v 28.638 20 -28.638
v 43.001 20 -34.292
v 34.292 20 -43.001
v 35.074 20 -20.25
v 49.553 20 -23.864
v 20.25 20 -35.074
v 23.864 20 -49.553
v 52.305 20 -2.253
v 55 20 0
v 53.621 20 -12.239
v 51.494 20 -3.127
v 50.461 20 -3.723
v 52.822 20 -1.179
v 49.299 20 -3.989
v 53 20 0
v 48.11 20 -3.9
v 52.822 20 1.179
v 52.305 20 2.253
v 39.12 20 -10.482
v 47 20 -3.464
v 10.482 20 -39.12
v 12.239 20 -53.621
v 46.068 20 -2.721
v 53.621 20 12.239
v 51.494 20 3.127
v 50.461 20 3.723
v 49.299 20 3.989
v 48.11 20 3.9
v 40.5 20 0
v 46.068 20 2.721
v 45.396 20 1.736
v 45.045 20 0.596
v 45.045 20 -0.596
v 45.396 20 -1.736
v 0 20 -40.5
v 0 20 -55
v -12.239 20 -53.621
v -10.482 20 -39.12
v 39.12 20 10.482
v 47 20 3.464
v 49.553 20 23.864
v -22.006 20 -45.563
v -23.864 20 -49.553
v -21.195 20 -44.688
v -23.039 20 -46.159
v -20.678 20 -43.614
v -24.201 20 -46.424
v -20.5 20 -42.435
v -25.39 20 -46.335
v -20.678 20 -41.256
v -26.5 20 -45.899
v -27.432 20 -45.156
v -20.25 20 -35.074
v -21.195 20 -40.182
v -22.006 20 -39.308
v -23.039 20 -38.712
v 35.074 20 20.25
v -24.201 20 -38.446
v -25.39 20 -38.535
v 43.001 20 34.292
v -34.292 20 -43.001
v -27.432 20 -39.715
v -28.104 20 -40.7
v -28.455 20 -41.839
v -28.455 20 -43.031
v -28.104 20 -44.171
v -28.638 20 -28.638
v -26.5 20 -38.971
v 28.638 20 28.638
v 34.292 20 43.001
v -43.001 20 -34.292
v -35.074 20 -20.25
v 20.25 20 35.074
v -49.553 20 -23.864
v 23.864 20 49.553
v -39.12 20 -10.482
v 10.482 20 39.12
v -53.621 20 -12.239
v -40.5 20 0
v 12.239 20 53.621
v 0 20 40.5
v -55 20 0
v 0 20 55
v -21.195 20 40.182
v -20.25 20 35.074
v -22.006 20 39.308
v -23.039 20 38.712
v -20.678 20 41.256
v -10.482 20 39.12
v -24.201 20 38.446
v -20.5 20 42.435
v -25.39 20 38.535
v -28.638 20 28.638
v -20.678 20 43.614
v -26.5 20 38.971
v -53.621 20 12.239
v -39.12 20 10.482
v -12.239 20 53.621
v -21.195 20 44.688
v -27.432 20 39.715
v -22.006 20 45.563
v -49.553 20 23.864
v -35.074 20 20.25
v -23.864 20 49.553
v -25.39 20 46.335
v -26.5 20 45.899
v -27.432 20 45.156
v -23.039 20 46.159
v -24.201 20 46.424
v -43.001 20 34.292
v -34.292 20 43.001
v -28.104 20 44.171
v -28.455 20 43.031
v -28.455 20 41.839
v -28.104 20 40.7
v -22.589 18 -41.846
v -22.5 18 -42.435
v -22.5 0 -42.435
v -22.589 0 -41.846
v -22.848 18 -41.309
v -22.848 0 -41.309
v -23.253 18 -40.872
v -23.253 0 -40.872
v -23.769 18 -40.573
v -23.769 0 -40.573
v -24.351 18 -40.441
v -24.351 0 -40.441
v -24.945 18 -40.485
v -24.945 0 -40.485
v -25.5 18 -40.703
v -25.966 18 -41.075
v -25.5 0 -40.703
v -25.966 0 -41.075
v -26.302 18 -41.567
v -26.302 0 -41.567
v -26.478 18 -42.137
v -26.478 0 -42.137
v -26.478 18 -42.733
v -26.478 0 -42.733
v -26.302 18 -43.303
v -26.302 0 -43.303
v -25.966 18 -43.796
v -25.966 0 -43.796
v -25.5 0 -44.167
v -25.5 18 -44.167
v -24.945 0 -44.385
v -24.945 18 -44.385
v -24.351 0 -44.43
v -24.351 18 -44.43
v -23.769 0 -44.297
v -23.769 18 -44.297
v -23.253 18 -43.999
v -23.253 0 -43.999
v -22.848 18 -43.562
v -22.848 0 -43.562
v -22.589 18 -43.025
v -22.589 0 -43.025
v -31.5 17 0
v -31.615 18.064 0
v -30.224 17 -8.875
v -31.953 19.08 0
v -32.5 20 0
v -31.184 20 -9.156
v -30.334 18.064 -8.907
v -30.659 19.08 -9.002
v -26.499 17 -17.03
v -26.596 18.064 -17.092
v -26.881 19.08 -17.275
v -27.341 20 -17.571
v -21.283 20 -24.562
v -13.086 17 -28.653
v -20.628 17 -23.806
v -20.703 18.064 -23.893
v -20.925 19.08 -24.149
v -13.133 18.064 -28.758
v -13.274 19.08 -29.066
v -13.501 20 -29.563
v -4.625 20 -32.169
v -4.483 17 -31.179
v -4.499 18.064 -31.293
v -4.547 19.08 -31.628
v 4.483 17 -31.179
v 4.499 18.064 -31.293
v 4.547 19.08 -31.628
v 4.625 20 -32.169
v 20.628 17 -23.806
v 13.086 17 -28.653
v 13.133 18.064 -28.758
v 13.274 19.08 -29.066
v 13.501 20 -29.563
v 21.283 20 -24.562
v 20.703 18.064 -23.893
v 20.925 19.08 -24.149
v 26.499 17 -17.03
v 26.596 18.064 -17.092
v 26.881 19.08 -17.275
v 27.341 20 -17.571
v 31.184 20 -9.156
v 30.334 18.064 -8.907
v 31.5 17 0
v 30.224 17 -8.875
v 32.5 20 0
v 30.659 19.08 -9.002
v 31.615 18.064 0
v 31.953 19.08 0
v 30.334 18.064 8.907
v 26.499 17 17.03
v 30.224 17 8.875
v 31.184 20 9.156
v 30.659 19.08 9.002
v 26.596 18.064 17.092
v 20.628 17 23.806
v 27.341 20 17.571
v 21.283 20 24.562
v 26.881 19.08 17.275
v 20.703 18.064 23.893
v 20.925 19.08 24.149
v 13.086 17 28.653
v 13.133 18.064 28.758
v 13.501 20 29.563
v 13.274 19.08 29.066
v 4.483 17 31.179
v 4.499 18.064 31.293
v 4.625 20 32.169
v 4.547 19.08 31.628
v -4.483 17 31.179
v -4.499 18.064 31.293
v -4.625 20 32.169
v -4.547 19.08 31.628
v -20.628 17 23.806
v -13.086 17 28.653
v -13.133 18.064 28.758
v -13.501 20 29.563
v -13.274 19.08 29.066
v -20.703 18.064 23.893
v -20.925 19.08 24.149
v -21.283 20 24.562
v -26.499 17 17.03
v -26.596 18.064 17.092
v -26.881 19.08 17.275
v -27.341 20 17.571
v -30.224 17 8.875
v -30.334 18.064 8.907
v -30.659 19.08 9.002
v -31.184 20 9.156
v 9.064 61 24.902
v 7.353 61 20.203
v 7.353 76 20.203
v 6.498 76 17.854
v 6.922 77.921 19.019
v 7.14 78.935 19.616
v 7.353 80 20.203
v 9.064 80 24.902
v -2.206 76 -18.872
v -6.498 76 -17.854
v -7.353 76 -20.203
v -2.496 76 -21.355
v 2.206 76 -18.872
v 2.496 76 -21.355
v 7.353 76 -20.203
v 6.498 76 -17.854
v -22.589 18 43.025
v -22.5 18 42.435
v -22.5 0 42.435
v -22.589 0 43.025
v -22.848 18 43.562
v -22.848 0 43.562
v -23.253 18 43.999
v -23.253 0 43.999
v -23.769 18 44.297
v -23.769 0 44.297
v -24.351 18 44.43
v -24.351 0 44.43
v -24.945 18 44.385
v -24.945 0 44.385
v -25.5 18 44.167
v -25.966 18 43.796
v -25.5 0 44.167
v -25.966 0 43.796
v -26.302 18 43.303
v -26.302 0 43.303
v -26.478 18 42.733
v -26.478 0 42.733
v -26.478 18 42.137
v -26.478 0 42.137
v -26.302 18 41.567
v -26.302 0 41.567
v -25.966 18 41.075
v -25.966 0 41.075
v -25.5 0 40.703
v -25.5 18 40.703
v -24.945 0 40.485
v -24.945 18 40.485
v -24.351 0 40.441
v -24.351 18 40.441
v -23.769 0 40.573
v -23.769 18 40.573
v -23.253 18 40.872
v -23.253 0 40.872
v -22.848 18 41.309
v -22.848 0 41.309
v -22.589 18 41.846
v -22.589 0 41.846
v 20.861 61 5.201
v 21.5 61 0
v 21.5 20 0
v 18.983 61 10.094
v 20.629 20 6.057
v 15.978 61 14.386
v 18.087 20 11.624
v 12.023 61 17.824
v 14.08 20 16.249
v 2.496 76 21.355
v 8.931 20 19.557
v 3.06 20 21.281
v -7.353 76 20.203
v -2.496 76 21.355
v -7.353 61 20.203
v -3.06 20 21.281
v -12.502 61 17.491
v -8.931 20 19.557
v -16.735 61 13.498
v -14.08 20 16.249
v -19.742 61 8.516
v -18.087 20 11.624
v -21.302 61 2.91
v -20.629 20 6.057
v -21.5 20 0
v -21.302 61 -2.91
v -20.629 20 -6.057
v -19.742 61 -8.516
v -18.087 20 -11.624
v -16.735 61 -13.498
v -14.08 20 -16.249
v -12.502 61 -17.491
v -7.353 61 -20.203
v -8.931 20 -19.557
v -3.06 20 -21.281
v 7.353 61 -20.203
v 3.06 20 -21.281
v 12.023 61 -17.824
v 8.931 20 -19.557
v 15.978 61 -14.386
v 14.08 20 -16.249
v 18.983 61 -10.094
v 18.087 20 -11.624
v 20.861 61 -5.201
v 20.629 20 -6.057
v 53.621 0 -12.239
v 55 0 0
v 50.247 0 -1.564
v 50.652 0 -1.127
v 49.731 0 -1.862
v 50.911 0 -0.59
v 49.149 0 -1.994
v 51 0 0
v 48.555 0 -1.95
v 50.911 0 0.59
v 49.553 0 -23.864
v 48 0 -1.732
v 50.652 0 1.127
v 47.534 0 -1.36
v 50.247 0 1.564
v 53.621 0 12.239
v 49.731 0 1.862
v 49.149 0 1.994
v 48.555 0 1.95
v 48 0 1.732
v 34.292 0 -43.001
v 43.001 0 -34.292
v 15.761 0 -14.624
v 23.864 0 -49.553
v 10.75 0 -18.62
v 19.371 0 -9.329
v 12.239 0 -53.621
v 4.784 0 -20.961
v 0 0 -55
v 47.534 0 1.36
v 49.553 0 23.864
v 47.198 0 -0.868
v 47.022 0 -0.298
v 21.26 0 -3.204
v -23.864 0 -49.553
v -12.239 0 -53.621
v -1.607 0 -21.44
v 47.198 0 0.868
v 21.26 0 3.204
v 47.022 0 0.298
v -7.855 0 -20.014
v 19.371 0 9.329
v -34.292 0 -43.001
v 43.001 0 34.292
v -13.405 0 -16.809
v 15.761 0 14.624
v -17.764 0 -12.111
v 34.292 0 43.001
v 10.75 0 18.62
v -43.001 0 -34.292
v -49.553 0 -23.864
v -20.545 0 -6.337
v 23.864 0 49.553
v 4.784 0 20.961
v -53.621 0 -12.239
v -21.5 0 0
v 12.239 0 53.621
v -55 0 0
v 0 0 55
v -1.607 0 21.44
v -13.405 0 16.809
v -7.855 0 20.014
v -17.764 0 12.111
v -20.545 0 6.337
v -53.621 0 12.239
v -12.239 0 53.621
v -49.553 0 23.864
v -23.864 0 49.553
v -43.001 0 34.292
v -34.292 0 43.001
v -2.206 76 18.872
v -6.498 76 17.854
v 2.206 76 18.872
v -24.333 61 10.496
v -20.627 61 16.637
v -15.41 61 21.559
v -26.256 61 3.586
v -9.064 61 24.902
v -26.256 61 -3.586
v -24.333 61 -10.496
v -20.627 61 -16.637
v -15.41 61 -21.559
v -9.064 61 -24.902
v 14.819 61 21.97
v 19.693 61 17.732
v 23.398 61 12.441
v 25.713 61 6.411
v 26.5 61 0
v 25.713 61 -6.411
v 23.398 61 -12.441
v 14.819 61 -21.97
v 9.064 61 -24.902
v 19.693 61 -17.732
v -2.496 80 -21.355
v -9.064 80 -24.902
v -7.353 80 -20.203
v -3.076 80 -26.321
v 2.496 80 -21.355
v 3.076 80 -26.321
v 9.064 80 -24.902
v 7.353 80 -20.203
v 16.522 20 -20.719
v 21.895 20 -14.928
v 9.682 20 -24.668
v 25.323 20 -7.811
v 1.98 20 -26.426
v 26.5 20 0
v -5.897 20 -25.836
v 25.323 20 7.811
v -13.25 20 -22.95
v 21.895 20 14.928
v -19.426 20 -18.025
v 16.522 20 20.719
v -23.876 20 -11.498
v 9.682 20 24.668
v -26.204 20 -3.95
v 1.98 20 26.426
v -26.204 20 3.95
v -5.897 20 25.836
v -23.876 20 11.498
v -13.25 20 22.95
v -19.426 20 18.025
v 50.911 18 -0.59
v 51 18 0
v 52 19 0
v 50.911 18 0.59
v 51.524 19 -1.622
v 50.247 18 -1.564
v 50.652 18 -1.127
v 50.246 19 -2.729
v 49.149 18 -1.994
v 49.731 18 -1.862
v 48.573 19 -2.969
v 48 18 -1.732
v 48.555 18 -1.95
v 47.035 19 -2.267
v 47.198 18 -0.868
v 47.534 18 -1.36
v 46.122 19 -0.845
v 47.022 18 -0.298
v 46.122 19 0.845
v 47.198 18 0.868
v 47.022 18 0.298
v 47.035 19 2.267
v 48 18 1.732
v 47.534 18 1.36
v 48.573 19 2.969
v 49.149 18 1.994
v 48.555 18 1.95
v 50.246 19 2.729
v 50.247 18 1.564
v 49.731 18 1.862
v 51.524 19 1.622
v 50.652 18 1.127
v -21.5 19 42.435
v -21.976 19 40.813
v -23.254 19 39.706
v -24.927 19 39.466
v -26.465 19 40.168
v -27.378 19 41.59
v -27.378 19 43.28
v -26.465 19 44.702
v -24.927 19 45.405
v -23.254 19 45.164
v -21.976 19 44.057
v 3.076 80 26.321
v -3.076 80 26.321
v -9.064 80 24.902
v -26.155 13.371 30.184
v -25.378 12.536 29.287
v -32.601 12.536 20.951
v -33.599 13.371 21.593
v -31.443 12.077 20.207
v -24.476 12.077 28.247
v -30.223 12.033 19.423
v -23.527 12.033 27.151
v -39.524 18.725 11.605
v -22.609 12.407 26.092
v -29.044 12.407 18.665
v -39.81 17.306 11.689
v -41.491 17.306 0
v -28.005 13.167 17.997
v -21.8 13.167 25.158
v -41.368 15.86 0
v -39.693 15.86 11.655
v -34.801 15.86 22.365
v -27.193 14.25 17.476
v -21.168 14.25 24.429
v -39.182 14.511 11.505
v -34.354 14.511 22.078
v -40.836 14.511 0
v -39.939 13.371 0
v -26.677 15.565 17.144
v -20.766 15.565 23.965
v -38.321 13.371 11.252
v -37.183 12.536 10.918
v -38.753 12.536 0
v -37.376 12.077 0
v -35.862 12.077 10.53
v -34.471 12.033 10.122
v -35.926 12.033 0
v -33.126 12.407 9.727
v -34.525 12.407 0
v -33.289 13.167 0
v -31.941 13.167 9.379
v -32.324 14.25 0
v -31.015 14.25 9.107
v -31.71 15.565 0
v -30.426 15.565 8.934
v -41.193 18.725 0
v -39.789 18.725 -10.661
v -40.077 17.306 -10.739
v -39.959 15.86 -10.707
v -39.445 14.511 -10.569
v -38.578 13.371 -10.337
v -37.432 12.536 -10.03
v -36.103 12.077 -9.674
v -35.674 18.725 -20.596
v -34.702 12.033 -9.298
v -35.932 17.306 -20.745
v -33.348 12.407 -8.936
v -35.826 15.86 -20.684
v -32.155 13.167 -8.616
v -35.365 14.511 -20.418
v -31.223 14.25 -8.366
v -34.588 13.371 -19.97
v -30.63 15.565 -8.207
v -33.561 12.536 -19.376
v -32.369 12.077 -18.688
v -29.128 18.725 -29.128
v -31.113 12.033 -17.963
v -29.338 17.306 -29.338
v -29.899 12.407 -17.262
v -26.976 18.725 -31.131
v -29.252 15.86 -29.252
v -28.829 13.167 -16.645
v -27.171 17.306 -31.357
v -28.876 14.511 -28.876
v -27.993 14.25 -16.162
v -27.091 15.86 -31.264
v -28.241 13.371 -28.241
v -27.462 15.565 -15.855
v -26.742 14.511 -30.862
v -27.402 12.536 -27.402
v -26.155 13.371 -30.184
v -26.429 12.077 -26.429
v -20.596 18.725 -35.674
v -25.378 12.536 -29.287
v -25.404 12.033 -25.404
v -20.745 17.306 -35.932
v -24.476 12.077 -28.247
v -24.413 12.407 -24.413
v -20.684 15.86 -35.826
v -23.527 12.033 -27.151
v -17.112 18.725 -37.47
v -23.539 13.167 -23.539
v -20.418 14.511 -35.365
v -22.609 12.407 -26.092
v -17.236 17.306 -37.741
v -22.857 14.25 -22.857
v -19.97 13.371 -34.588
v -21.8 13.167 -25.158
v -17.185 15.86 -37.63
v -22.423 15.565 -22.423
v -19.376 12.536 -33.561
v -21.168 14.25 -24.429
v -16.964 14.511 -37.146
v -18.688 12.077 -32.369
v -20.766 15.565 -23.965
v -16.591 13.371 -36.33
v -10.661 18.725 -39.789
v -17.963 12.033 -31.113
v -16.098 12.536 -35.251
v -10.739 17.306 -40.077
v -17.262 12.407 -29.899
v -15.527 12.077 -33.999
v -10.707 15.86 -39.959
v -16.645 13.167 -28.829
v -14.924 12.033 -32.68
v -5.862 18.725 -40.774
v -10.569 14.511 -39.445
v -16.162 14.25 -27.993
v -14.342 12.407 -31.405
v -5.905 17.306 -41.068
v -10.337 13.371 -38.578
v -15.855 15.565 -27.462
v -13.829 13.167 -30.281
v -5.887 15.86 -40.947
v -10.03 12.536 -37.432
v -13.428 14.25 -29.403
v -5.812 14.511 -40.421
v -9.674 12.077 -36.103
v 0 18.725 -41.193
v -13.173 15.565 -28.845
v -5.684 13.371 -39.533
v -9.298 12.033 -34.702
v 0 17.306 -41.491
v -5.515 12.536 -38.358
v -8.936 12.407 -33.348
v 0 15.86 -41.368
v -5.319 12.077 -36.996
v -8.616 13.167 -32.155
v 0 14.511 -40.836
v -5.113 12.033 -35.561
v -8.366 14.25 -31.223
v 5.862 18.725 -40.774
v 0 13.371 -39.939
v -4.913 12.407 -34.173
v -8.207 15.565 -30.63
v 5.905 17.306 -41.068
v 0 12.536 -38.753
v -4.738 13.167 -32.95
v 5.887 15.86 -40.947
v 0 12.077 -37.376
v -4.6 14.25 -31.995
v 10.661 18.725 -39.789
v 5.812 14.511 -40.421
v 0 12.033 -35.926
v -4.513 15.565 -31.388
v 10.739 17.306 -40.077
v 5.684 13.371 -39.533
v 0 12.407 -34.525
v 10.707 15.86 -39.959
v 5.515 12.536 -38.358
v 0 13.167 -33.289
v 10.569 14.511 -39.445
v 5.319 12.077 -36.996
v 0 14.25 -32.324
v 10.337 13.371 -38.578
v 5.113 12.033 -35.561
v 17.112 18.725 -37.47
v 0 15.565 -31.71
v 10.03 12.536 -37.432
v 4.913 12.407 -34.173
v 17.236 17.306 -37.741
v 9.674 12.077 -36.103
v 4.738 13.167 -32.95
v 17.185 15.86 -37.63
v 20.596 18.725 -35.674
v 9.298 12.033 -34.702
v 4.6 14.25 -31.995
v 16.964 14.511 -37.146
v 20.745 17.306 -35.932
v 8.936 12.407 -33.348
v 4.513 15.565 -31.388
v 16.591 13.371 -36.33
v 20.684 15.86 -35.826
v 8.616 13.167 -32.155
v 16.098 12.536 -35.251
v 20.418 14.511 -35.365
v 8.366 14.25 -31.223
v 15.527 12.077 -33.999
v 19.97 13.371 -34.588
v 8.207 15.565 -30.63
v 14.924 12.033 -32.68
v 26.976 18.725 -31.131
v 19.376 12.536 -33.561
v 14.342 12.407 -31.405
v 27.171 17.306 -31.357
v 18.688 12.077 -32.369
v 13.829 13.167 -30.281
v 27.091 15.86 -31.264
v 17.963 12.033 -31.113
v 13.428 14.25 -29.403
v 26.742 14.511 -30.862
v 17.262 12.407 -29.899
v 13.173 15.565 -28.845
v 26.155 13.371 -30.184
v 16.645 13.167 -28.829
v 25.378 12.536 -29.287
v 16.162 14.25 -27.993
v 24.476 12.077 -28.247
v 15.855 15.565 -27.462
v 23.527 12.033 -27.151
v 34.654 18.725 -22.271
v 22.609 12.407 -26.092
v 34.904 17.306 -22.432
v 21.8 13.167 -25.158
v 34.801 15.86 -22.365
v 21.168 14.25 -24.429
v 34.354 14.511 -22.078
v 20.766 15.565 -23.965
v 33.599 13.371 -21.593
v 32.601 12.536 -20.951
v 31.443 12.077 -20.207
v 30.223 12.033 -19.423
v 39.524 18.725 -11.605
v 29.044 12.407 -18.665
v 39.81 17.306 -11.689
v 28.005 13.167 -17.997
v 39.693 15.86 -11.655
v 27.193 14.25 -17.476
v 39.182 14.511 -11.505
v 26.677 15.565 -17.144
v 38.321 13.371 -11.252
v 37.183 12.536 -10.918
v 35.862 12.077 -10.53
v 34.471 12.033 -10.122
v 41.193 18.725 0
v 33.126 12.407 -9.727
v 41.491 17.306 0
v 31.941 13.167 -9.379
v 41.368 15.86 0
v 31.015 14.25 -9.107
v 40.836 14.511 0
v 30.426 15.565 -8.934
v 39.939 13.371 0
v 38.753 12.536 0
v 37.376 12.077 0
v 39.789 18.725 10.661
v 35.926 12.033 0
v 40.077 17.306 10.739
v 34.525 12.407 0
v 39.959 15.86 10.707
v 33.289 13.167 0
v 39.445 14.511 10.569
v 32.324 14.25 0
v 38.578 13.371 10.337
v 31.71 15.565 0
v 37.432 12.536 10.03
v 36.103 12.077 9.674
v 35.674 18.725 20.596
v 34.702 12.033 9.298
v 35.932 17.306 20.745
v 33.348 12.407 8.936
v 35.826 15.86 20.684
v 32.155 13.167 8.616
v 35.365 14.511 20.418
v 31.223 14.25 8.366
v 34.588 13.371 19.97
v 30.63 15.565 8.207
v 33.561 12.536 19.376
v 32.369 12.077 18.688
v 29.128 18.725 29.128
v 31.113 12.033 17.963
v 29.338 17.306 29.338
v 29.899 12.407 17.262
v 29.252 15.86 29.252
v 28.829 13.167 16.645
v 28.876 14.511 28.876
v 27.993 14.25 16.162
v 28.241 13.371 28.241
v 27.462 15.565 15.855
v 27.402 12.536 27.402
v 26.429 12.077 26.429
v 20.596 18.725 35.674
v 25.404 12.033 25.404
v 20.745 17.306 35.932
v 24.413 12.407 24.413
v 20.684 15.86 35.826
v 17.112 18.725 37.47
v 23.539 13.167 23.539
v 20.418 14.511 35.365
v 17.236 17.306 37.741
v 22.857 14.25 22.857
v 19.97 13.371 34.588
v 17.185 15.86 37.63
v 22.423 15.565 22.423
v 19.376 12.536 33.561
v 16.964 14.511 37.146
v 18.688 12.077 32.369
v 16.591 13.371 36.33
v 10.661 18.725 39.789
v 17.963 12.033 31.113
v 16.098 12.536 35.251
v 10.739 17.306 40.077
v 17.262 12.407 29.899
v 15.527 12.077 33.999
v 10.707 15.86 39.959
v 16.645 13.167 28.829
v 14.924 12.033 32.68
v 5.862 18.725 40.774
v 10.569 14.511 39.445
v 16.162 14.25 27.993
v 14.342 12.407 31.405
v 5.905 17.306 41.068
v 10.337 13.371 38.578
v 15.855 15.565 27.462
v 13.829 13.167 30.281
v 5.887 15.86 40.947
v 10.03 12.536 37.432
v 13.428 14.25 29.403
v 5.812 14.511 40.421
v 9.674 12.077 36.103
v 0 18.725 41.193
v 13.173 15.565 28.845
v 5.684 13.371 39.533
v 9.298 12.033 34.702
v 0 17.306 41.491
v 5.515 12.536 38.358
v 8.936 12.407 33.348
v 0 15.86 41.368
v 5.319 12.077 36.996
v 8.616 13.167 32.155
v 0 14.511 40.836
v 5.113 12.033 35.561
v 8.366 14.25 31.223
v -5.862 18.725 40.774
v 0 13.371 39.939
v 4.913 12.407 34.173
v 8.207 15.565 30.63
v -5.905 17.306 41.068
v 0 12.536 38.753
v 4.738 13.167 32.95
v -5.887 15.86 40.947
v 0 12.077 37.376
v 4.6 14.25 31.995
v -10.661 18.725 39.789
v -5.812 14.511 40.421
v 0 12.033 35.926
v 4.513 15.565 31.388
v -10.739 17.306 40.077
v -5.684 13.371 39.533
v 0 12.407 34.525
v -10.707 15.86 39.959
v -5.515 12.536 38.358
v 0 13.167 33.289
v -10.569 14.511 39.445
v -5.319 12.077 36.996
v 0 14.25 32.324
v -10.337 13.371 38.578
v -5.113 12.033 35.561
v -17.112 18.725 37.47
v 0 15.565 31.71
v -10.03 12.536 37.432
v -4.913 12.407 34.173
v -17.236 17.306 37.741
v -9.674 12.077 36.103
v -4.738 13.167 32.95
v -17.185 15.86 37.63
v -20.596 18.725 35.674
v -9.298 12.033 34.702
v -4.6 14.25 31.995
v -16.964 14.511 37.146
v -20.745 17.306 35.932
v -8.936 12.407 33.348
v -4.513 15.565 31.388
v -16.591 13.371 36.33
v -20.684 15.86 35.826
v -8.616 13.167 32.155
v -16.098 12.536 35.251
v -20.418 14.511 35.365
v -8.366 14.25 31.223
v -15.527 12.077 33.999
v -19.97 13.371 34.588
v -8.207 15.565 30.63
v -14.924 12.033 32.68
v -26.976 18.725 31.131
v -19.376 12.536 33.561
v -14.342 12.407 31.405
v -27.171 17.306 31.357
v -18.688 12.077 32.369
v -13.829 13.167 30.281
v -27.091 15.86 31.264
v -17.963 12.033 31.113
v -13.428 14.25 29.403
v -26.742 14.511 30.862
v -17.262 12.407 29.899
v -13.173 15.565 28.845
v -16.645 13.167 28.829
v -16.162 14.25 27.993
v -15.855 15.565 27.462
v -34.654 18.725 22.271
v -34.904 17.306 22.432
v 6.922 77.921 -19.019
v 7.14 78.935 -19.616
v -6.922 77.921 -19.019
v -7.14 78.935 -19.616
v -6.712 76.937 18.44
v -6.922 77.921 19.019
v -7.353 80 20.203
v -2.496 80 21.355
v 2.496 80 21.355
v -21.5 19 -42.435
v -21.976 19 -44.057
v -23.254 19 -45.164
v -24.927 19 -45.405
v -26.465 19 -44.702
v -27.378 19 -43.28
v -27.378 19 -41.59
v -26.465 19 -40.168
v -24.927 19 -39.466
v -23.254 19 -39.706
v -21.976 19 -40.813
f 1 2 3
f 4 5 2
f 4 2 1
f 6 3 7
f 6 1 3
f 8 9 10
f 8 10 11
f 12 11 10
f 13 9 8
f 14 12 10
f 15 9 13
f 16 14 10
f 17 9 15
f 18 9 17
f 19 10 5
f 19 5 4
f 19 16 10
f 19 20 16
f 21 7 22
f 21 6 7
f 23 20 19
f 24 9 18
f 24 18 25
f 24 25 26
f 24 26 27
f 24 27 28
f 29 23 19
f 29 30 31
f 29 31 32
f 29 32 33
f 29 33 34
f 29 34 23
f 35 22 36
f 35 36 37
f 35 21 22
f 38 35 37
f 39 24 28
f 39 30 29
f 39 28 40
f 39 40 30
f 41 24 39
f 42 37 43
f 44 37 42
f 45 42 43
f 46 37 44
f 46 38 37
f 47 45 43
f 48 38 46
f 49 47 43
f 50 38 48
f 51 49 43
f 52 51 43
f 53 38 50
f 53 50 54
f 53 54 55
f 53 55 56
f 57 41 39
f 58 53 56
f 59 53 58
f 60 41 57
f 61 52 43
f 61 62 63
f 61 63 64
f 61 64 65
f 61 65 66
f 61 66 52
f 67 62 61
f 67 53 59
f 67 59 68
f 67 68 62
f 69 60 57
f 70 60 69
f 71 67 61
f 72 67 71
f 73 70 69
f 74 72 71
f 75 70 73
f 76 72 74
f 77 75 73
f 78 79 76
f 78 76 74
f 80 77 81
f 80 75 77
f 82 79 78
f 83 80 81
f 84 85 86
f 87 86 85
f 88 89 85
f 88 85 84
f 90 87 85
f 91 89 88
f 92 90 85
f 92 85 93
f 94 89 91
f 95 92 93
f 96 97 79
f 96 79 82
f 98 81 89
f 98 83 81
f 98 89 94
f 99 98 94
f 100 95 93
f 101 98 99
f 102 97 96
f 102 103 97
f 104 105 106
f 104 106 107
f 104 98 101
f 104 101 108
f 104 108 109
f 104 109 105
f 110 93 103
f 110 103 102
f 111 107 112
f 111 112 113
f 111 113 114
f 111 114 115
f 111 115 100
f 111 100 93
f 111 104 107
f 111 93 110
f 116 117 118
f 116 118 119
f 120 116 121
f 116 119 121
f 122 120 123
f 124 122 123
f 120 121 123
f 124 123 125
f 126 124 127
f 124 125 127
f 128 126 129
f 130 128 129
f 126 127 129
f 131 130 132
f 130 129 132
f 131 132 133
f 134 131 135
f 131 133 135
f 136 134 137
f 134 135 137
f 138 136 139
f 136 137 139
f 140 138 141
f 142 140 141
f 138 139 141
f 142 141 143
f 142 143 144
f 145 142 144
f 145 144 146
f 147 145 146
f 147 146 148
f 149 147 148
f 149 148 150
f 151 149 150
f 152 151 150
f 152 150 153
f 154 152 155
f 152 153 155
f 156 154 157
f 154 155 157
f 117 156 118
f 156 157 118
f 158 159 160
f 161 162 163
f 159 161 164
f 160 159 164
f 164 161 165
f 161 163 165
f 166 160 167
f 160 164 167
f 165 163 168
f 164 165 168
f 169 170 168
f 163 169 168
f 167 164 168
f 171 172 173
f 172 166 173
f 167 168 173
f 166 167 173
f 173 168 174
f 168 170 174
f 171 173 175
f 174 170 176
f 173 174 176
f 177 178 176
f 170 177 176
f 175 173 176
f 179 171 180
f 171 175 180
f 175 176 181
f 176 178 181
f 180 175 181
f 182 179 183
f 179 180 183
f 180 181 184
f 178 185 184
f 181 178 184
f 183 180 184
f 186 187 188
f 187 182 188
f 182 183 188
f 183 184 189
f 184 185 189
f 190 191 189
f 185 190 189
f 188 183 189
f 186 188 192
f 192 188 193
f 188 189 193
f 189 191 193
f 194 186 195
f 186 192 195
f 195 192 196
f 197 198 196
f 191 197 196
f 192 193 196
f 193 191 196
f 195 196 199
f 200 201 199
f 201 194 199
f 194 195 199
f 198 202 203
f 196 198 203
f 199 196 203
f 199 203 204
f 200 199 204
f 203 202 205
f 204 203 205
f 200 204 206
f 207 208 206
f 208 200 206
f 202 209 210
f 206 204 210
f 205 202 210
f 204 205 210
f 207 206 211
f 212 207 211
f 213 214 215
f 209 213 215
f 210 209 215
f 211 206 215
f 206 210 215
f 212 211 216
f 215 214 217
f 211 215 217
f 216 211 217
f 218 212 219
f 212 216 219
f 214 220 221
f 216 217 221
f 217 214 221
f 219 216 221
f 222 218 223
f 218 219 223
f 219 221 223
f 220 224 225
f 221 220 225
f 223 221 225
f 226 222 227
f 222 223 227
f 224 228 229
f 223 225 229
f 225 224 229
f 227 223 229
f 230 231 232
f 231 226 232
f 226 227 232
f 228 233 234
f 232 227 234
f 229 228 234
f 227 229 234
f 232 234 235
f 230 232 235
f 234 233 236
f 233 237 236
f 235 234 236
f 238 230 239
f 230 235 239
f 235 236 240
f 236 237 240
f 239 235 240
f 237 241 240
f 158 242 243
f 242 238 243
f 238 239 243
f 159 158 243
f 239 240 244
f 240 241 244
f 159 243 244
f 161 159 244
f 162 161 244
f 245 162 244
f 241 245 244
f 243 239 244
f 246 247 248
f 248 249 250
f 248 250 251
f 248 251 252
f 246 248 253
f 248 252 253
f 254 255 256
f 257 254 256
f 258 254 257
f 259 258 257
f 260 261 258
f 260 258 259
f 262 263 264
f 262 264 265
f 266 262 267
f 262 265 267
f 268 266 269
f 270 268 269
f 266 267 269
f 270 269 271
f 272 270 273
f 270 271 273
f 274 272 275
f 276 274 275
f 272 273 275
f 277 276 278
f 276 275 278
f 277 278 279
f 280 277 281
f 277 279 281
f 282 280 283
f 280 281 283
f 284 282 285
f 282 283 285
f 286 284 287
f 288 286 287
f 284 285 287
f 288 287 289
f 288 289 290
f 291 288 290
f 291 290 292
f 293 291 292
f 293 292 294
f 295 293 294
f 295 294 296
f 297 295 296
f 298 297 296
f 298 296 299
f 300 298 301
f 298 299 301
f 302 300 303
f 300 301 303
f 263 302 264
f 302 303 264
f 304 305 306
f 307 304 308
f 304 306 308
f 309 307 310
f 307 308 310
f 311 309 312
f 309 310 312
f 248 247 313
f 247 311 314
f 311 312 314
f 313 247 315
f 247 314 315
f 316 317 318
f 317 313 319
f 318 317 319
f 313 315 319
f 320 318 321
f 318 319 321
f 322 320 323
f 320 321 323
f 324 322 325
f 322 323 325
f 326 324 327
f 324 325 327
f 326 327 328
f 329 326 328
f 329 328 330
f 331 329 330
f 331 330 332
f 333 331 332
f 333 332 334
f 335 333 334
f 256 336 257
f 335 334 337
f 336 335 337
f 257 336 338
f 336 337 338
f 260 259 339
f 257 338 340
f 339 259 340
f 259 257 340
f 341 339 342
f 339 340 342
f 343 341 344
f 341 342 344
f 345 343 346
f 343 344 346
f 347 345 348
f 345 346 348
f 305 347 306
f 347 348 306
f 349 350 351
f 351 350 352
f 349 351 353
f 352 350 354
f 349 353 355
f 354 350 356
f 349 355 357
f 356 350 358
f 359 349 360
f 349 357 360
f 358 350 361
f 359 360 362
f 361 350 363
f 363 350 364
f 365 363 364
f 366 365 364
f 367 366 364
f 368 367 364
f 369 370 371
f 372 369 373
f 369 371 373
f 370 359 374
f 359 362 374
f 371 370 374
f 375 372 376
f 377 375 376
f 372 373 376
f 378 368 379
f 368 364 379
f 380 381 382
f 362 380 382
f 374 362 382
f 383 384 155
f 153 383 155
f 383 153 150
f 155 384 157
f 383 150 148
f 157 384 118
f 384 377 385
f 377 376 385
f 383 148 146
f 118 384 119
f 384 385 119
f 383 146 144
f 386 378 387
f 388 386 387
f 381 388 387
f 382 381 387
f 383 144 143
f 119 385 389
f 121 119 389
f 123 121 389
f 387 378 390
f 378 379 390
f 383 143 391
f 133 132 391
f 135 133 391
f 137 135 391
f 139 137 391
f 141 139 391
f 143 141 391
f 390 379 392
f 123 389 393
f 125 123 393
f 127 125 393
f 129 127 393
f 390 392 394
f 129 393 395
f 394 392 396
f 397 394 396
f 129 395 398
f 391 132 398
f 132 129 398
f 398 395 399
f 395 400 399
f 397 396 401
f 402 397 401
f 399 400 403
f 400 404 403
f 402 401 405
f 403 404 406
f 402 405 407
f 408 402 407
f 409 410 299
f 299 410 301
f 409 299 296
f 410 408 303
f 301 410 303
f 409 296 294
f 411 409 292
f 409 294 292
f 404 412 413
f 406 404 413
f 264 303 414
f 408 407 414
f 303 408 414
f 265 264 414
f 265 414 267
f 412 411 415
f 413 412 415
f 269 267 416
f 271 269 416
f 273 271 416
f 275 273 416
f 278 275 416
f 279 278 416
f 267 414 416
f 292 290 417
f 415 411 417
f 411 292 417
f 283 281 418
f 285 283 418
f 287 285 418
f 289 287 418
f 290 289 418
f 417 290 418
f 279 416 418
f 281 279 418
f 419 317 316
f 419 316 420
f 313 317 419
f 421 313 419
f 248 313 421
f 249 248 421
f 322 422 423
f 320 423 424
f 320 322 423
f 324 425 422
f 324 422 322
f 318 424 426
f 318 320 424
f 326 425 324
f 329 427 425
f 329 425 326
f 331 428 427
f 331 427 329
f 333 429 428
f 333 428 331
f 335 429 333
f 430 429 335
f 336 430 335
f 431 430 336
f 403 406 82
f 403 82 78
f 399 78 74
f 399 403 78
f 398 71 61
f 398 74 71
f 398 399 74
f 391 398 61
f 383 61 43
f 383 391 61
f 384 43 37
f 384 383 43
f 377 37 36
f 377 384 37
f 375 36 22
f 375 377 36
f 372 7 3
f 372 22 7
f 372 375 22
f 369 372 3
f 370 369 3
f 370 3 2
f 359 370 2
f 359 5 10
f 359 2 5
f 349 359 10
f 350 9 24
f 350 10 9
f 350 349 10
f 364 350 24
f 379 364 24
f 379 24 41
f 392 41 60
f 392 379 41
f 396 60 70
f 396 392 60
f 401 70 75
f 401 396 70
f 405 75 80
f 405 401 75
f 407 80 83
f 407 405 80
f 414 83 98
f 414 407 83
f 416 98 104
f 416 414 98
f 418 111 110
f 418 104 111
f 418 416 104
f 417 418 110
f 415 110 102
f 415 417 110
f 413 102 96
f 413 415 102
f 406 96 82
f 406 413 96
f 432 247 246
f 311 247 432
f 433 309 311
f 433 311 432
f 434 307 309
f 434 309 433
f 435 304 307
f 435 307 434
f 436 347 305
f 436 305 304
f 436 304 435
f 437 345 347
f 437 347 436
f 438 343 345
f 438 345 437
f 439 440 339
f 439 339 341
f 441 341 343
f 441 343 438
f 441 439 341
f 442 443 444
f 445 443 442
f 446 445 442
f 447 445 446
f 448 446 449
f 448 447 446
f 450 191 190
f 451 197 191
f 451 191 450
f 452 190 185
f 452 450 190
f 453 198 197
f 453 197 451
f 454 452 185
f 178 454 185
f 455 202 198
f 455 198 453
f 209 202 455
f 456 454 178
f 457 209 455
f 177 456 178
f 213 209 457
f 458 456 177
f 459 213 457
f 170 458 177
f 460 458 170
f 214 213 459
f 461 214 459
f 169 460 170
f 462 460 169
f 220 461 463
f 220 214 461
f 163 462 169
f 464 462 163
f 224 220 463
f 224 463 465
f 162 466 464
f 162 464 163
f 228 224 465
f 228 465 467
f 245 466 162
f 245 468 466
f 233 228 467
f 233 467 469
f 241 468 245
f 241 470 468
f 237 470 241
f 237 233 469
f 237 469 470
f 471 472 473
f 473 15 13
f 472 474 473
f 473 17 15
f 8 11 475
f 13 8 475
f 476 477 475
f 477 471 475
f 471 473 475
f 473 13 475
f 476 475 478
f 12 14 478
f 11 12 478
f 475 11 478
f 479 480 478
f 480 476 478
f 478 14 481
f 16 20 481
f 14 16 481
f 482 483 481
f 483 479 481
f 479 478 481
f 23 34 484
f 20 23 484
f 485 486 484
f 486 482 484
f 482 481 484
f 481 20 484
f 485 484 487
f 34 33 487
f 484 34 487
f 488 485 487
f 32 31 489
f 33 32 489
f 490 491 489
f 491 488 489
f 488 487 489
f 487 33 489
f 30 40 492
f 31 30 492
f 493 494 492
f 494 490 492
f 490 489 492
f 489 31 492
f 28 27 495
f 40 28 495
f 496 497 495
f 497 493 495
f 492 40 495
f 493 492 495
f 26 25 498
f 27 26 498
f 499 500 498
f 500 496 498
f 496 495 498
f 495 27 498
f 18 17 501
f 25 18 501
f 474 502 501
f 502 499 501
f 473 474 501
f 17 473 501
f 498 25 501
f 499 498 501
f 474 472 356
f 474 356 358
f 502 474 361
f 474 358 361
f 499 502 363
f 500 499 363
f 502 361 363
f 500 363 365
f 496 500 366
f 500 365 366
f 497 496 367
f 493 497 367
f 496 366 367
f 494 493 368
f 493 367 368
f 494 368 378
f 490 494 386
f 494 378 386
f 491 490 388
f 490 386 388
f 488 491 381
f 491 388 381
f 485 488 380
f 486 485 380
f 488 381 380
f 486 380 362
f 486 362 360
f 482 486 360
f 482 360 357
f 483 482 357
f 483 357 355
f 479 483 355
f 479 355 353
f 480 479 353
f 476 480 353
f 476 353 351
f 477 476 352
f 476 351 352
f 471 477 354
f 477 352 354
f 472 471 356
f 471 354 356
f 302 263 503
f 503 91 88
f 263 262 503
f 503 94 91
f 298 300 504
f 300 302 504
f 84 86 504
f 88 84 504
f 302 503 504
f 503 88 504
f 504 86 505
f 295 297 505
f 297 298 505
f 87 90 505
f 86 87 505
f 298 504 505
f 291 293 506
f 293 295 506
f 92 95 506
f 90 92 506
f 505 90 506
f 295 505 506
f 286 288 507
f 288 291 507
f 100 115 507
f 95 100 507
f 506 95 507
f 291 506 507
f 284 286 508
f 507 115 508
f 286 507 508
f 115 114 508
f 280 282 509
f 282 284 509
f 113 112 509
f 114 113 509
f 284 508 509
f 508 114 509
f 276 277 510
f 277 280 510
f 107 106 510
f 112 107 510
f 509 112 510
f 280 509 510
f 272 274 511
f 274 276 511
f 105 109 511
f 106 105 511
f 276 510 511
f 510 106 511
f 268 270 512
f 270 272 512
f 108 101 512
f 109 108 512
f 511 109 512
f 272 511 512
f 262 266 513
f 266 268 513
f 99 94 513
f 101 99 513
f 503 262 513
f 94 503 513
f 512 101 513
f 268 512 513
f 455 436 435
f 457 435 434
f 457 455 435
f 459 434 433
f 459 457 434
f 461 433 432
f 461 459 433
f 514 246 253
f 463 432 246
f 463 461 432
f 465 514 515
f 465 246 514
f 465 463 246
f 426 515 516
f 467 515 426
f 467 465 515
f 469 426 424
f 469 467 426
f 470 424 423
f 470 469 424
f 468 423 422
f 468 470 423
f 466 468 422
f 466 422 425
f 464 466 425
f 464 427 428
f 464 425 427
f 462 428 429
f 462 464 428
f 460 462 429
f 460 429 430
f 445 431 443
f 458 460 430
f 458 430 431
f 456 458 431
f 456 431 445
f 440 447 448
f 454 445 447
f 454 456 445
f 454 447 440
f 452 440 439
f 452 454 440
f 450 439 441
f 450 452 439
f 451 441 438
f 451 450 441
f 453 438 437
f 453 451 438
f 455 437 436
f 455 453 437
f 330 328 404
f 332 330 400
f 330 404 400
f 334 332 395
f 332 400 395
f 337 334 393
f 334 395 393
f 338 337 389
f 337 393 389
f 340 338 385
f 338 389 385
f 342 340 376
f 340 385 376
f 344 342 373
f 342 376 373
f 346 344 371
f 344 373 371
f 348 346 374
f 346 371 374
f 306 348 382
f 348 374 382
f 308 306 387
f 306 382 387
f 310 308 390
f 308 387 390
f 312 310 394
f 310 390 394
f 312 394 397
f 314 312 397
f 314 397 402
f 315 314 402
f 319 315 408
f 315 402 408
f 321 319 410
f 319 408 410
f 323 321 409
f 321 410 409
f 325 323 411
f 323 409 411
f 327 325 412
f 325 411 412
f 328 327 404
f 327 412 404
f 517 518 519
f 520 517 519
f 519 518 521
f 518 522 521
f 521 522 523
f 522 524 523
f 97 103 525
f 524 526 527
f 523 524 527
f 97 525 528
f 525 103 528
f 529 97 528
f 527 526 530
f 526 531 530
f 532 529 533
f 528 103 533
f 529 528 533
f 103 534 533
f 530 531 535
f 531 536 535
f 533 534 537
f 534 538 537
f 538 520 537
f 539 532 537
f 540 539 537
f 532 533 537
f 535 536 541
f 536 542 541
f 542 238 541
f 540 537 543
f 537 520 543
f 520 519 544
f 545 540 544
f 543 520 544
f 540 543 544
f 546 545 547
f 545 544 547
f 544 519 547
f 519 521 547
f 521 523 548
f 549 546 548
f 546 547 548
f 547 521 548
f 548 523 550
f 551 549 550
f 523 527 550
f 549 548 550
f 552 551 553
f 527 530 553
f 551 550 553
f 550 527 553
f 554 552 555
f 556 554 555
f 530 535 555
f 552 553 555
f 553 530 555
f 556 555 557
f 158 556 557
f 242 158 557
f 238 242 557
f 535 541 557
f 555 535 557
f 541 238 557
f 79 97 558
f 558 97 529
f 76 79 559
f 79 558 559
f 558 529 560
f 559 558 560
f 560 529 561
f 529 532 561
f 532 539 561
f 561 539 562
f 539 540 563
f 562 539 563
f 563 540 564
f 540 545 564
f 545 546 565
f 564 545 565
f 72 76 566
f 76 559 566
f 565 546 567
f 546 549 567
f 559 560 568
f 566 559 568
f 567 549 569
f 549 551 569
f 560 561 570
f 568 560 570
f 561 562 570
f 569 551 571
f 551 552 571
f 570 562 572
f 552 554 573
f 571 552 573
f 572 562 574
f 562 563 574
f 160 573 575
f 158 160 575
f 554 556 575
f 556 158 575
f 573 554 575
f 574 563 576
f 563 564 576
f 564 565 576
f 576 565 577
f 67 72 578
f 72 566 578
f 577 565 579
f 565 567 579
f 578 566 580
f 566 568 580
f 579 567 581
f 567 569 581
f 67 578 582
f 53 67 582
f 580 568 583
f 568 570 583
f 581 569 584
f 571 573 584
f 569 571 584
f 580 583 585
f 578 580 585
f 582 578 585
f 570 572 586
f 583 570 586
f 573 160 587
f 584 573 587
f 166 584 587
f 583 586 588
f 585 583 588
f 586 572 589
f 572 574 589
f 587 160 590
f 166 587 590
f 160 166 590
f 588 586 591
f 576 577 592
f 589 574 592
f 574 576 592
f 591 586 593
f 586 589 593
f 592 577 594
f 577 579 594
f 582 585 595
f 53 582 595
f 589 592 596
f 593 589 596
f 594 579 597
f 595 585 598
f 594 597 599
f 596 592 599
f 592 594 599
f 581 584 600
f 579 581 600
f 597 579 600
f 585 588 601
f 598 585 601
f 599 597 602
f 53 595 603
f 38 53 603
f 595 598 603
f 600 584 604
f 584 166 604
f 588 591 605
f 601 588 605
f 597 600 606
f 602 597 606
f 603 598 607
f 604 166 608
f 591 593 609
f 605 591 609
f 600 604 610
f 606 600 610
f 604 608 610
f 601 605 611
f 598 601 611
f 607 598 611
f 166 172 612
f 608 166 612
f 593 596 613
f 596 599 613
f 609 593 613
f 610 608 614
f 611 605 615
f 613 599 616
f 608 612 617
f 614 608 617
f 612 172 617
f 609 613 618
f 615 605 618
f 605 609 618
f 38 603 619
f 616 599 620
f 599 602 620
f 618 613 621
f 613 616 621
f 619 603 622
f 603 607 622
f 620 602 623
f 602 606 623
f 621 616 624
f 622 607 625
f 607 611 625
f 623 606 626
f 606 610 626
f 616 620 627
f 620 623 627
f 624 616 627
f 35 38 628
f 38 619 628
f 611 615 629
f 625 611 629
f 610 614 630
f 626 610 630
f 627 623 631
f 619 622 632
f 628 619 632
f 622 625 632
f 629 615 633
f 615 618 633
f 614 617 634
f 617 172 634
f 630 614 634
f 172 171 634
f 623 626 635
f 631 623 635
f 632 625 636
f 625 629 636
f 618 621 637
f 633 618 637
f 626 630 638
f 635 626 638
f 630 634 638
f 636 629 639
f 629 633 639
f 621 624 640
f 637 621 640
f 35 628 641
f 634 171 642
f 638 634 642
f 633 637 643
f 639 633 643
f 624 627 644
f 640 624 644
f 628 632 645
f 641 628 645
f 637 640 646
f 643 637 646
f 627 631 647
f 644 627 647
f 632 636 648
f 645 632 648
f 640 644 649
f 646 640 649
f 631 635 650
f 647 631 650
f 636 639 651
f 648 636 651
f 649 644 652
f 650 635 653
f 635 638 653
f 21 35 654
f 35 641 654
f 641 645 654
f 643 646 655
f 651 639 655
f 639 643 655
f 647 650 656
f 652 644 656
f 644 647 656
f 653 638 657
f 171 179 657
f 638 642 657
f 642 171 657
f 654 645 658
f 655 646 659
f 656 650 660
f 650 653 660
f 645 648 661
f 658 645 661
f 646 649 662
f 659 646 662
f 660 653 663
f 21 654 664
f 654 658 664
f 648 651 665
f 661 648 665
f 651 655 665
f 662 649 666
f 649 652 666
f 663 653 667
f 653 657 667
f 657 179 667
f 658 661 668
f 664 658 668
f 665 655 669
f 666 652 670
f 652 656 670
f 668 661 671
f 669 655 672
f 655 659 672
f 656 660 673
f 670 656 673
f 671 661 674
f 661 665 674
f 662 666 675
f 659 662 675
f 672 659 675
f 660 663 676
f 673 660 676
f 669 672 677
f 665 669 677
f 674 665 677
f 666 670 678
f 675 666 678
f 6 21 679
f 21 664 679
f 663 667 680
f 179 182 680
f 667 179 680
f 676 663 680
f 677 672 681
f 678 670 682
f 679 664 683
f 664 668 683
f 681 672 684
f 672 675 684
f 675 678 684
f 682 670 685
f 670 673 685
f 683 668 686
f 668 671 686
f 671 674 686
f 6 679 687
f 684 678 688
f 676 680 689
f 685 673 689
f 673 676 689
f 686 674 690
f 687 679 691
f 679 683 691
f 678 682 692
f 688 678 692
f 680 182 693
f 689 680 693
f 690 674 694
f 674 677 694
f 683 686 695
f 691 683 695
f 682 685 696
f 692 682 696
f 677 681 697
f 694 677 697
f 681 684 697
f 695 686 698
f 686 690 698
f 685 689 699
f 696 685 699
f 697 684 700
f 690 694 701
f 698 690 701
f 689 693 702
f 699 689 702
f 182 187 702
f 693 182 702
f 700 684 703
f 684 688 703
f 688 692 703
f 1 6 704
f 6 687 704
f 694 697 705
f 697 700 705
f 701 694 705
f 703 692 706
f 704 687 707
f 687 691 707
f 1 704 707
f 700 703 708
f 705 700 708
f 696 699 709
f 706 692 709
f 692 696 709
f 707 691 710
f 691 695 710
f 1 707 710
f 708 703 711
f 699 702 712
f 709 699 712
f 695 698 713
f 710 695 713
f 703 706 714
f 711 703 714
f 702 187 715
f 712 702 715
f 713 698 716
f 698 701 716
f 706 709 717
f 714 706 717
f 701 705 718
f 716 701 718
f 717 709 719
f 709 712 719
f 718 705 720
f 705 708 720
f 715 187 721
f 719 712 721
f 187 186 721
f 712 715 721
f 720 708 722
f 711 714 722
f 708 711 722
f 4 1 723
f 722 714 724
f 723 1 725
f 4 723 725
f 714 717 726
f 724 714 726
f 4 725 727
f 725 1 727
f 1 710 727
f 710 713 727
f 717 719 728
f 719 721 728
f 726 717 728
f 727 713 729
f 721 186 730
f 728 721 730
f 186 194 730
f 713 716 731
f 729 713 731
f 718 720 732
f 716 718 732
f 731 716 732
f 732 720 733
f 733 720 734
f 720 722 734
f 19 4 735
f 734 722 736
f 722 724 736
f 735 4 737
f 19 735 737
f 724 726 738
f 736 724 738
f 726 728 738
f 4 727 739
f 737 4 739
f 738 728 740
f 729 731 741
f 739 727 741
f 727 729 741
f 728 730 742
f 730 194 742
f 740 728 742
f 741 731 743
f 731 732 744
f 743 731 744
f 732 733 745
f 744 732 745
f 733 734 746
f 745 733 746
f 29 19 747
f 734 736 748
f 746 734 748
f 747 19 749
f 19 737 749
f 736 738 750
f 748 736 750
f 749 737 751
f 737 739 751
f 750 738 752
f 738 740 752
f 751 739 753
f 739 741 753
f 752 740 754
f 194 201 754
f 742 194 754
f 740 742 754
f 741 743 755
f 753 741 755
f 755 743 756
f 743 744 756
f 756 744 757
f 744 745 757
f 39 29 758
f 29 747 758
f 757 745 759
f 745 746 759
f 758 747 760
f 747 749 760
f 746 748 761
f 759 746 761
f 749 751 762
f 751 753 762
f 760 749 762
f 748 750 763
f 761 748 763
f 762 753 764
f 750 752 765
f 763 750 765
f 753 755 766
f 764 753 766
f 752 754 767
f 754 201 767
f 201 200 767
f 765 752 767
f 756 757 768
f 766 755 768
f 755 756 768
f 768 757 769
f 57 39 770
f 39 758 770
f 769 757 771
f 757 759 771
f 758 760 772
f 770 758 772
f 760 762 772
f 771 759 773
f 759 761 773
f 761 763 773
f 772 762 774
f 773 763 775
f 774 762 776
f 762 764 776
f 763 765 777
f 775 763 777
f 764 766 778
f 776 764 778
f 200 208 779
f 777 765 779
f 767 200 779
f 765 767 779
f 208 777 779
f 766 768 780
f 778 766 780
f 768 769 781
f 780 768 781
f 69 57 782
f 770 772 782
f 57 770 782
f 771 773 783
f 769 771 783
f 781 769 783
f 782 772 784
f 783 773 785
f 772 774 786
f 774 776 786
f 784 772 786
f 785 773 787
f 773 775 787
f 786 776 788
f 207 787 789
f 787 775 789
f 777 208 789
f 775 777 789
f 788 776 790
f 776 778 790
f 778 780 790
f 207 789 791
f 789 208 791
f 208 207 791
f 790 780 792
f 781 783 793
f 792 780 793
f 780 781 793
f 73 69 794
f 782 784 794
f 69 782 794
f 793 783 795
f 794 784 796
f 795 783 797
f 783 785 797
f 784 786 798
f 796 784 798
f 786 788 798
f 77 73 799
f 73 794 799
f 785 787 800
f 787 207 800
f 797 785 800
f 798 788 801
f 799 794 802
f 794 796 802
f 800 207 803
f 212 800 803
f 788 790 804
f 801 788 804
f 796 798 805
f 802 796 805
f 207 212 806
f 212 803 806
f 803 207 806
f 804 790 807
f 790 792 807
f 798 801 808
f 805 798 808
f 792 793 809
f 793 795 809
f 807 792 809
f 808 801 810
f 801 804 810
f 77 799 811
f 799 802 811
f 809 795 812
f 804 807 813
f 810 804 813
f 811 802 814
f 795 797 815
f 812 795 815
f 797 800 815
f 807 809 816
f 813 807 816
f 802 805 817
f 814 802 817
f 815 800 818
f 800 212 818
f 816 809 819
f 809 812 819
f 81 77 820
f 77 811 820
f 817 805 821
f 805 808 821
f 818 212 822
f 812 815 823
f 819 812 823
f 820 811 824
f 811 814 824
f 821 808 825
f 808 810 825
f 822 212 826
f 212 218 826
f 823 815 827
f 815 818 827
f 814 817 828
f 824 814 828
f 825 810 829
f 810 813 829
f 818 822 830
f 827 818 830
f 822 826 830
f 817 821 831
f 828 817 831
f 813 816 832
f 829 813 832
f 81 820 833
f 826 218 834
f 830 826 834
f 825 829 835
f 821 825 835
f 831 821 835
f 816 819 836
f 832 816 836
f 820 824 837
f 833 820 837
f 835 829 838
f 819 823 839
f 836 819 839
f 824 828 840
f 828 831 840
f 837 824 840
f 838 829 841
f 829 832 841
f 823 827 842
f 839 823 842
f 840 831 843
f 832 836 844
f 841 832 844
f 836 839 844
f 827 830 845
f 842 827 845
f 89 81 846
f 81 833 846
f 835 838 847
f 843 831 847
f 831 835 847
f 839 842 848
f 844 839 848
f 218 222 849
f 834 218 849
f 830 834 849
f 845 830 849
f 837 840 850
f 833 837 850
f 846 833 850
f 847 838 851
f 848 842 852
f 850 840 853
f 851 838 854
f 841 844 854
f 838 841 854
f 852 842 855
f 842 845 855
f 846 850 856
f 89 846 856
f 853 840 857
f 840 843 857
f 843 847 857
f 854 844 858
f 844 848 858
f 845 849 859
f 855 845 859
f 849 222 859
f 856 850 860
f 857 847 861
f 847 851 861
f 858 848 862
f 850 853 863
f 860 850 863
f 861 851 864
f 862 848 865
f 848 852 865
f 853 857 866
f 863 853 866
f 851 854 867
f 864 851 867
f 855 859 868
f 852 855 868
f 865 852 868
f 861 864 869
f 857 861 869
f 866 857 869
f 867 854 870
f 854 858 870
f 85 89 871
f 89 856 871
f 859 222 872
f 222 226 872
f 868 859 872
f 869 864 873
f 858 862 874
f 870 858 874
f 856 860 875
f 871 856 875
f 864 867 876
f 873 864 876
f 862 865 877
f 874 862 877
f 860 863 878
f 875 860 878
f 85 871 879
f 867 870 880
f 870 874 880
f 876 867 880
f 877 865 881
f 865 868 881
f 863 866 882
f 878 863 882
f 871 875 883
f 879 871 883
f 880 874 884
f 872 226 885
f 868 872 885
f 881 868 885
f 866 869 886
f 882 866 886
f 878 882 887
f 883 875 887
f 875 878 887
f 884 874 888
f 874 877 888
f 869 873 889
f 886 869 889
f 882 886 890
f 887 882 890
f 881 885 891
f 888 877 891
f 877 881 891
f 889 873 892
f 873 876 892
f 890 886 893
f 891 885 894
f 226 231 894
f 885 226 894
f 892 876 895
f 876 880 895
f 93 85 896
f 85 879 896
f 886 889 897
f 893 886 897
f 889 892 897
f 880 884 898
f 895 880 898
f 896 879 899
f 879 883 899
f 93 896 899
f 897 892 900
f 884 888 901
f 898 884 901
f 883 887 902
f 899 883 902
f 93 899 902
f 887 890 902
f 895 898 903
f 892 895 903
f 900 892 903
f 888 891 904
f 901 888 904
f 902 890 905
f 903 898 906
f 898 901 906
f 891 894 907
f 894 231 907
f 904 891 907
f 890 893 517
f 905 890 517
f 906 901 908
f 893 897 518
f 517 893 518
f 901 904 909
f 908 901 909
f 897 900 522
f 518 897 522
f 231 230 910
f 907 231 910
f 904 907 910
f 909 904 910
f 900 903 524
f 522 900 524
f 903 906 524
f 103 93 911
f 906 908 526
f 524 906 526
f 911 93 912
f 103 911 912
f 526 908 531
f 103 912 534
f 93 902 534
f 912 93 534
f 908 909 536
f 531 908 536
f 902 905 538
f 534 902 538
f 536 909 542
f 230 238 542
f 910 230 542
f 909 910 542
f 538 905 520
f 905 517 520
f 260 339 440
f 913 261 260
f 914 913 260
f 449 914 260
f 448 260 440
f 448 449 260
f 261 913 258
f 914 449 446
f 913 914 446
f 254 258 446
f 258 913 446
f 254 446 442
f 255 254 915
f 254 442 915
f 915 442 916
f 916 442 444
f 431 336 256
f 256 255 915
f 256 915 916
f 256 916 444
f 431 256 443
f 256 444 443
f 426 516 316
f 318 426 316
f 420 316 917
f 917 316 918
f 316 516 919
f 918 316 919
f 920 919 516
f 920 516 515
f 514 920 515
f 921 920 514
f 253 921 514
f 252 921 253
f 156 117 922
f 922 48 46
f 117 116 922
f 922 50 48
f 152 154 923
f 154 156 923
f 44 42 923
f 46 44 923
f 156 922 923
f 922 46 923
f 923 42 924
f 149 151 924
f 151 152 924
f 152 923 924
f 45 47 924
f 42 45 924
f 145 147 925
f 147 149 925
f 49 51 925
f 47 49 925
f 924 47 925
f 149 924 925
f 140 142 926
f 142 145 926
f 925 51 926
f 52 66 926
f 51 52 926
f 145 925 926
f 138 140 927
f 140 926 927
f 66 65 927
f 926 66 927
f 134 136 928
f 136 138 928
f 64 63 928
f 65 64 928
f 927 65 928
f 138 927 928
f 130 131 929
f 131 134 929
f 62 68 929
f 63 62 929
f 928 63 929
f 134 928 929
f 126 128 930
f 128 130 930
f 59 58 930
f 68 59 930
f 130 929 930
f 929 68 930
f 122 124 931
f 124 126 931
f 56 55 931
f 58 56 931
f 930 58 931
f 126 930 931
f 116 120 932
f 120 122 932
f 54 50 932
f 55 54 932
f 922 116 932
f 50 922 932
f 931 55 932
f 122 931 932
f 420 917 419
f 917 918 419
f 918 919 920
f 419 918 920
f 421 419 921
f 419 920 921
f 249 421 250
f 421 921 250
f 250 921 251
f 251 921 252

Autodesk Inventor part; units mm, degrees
ref_plane "YZ Plane" through (0, 0, 0) normal (1, 0, 0) x (0, 1, 0)
ref_plane "XZ Plane" through (0, 0, 0) normal (0, 1, 0) x (-1, 0, 0)
ref_plane "XY Plane" through (0, 0, 0) normal (0, 0, 1) x (1, 0, 0)
sketch "Sketch1" plane through (0, 0, 0) normal (0, 1, 0) x (-1, 0, 0)
  circle A0 centre (0, 0) radius 21.5
  circle A1 centre (0, 0) radius 55
  dimension "d0" = 43
  dimension "d1" = 110
extrude "Extrusion1" add sketch "Sketch1" along normal blind 20
sketch "Sketch2" plane through (0, 0, 0) normal (0, 0, 1) x (1, 0, 0)
  line L0 (0, 0) -> (0, 20)
  line L1 (55, 20) -> (-55, 20) projected
  circle A0 centre (-36.5, 17) radius 5
  line L2 (-21.5, 0) -> (-21.5, 20) construction
  line L3 (-21.5, 20) -> (-21.5, 0) construction
  dimension "d4" = 10
  dimension "d5" = 15
revolve "Revolution1" cut sketch "Sketch2" angle 360 about axis through (0, 0, 0) along (0, 1, 0)
sketch "Sketch3" plane through (0, 20, 0) normal (0, 1, 0) x (1, 0, 0)
  circle A0 centre (0, 0) radius 21.5
  circle A1 centre (0, 0) radius 26.5
  circle A2 centre (0, 0) radius 21.5 projected
  dimension "d18" = 43
  dimension "d19" = 43
  dimension "d20" = 53
extrude "Extrusion2" add sketch "Sketch3" along normal blind 60
sketch "Sketch4" plane through (0, 0, 0) normal (1, 0, 0) x (0, 1, 0)
  line L0 (80, 21.5) -> (80, -21.5) projected
  line L1 (80, -21.5) -> (76, -19)
  line L2 (76, -19) -> (76, -21.5)
  line L3 (0, -21.5) -> (80, -21.5) projected
  line L4 (80, -21.5) -> (76, -21.5)
  line L5 (80, 0) -> (74, 0)
  point P0 (0, 0)
  dimension "d9" = 2.5
revolve "Revolution2" add sketch "Sketch4" angle 360 about axis through (0, 80, 0) along (0, -1, 0)
sketch "Sketch5" plane through (0, 80, 0) normal (0, 1, 0) x (1, 0, 0)
  line L0 (0, 4) -> (0, -4)
  line L1 (0, 0) -> (6.4984, 17.8542) construction
  line L2 (0, 0) -> (-6.4984, 17.8542) construction
  line L3 (0, 0) -> (9.0635, 24.9019) construction
  line L4 (0, 0) -> (0, 0) construction
  circle A0 centre (0, 0) radius 26.5 projected
  arc A1 (-9.0635, 24.9019) -> (-9.0635, -24.9019) centre (0, 0) ccw
  line L5 (0, 0) -> (-9.0635, -24.9019) construction
  line L6 (0, 0) -> (-9.0635, 24.9019) construction
  arc A2 (9.0635, -24.9019) -> (9.0635, 24.9019) centre (0, 0) ccw
  line L7 (0, 0) -> (9.0635, -24.9019) construction
  line L8 (0, 0) -> (9.0635, 24.9019) construction
  circle A3 centre (0, 0) radius 19 projected
  arc A4 (-6.4984, 17.8542) -> (-6.4984, -17.8542) centre (0, 0) ccw
  arc A5 (6.4984, -17.8542) -> (6.4984, 17.8542) centre (0, 0) ccw
  line L9 (-9.0635, -24.9019) -> (-6.4984, -17.8542)
  line L10 (6.4984, -17.8542) -> (9.0635, -24.9019)
  line L11 (6.4984, 17.8542) -> (9.0635, 24.9019)
  line L12 (-6.4984, 17.8542) -> (-9.0635, 24.9019)
  dimension "d22" = 40
  dimension "d23" = 40
  dimension "d24" = 20
  dimension "d25" = 20
  dimension "d26" = 140
  dimension "d27" = 140
extrude "Extrusion3" cut sketch "Sketch5" against normal blind 19 contours A0 L10 A3 L11 | L12 A3 L9 A0
sketch "Sketch6" plane through (0, 0, 0) normal (0, -1, 0) x (1, 0, 0)
  circle A0 centre (49, 0) radius 2
  circle A1 centre (-24.5, 42.4352) radius 2
  circle A2 centre (-24.5, -42.4352) radius 2
  point P0 (0, 0)
  dimension "d32" = 360
extrude "Extrusion4" cut sketch "Sketch6" against normal up to surface (20 mm away)
chamfer "Chamfer2" distance 2 angle 45 3 edges at (-26.5, 20, -42.4352) (-26.5, 20, 42.4352) (47, 20, 0)
equation "\"d19\" = d18"
properties part number "Blower Attachement"
